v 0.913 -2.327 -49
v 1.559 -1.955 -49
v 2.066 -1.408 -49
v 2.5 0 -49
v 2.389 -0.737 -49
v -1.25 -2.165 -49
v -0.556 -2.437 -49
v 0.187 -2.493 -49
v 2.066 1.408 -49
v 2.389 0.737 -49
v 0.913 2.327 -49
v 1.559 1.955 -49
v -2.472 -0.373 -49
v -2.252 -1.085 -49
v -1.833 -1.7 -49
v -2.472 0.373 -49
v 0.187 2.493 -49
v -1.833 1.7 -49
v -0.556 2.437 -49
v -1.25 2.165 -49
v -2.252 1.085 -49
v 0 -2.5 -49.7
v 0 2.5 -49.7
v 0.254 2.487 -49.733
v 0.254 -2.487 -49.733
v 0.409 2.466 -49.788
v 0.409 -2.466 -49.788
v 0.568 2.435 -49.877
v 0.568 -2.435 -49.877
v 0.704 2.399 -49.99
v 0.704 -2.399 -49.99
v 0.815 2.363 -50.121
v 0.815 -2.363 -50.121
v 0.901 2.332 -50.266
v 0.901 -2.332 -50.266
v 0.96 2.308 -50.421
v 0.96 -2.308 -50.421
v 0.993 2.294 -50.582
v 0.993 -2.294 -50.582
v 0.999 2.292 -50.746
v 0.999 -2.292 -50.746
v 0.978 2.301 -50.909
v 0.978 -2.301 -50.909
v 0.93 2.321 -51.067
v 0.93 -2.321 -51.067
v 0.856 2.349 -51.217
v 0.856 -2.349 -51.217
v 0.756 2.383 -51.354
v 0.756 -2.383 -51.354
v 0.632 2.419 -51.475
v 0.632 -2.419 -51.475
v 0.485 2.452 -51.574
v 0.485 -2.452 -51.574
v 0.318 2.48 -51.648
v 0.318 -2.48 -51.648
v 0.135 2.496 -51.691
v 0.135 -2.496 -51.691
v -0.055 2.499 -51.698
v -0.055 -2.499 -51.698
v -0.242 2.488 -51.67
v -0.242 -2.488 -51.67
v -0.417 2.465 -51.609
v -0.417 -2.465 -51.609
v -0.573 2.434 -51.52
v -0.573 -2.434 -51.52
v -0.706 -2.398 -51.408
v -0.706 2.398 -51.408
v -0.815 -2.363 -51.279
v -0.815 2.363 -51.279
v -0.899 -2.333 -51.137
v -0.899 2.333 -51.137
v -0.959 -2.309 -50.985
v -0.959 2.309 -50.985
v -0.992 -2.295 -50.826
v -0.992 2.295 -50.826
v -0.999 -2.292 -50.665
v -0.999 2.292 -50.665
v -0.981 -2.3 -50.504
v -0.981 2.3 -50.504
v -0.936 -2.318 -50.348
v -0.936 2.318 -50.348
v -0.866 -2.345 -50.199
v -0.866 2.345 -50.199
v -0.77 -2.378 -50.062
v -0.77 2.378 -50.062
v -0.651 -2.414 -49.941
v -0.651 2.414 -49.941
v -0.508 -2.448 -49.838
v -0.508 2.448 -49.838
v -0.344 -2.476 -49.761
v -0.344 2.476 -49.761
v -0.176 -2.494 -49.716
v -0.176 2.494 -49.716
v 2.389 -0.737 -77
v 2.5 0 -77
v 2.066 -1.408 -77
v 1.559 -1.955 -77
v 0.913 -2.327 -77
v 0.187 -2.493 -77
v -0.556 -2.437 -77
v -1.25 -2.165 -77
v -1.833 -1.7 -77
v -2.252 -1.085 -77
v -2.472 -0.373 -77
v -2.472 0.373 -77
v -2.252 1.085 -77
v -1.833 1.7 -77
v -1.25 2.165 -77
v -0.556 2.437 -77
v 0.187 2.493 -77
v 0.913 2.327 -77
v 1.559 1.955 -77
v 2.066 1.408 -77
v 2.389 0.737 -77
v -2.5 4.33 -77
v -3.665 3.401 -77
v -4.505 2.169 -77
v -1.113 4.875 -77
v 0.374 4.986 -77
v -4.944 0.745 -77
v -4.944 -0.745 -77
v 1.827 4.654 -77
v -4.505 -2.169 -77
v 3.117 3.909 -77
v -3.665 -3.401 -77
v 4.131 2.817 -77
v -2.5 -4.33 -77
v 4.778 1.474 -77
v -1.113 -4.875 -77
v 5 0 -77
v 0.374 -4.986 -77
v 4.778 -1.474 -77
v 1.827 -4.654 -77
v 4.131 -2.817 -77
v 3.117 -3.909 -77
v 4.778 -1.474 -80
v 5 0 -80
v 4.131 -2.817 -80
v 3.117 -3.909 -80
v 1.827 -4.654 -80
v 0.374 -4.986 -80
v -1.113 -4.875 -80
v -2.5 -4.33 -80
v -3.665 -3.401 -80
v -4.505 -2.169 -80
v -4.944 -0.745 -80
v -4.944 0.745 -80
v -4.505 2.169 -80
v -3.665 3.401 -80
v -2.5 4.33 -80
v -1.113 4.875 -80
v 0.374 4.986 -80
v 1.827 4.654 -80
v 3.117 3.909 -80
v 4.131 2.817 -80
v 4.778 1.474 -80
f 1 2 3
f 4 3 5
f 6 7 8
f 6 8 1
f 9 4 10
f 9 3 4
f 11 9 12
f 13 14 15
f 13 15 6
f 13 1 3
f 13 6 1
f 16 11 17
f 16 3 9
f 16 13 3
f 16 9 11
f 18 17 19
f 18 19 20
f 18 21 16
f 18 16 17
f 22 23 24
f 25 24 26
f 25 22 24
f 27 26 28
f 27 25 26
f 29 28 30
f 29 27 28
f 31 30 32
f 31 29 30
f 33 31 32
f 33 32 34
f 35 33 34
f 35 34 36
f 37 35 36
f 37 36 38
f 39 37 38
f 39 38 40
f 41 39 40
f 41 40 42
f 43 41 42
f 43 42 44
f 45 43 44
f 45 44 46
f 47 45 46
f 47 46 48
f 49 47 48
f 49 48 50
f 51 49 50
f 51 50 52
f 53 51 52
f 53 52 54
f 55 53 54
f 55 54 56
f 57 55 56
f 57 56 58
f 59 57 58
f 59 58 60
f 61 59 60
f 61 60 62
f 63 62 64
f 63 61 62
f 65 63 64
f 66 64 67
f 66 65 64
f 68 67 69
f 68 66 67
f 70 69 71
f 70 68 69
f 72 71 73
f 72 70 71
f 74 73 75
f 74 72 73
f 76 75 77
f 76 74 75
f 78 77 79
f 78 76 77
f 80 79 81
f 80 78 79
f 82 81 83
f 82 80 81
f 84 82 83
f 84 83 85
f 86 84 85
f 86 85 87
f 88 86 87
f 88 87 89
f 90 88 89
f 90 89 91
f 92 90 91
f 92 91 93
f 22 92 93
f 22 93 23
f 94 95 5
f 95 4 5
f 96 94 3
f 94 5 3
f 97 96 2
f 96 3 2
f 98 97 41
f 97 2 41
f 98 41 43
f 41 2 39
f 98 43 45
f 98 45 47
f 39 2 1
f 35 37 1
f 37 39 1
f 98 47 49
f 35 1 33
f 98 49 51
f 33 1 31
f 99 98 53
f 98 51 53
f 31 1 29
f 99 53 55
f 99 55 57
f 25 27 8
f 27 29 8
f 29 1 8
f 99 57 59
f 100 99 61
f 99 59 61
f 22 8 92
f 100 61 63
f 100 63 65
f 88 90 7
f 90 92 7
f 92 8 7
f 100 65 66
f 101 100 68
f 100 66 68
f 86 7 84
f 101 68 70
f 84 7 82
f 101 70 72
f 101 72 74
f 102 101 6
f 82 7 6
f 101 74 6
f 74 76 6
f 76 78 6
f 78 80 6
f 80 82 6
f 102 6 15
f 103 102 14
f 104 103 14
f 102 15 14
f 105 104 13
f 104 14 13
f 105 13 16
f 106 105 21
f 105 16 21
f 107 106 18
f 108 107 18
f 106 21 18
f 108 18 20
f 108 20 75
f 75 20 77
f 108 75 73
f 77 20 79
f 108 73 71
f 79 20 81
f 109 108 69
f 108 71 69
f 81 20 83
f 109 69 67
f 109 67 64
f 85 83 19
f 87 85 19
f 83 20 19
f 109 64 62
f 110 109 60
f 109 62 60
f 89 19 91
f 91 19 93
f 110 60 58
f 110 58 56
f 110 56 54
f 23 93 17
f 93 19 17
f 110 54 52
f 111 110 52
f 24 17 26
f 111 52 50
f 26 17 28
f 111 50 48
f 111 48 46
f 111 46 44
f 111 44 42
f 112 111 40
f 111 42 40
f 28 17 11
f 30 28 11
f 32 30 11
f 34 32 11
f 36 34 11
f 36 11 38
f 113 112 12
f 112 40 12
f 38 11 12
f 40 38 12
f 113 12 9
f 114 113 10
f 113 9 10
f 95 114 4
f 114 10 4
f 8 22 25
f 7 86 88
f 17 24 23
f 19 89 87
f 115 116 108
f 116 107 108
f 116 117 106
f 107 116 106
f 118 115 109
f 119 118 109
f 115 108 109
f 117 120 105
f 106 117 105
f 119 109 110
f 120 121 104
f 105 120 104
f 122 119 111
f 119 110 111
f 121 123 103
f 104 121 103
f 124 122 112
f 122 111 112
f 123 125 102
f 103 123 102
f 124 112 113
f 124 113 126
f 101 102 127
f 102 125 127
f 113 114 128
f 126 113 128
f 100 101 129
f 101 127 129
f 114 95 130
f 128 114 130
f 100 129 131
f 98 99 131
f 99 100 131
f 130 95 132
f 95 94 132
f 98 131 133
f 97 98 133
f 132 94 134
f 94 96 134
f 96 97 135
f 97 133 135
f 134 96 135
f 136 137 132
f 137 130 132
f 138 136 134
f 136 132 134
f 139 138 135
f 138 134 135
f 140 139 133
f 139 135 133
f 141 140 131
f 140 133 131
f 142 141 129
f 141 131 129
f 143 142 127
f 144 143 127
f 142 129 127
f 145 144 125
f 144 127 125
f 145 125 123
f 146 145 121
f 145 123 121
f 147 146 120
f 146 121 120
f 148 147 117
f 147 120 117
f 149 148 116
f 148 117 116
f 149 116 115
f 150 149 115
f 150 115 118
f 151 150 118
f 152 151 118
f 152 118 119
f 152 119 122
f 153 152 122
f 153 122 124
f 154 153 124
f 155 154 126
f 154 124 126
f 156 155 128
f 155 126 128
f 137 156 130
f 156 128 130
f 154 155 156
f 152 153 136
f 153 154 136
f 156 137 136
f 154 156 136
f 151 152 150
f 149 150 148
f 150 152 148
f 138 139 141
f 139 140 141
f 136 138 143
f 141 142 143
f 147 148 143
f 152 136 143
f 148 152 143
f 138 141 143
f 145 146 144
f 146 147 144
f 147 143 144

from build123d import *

# Parameters (mm, degrees)
CUT_EXTRUDE1_DEPTH      = 81.311892021
CUT_EXTRUDE1_DEPTH_BACK = 81.311892021
SKETCH3_W               = 130
SKETCH3_H               = 11.269282723
CUT_EXTRUDE2_DEPTH      = 81.311892021
CUT_EXTRUDE2_DEPTH_BACK = 81.311892021
SKETCH4_R               = 1


with BuildPart() as part:
    # Sketch2 → Revolve1 (revolve)
    with BuildSketch(Plane(origin=(0, 0, 0), x_dir=(0, 0, -1), z_dir=(1, 0, 0)), mode=Mode.PRIVATE) as revolve1_sk:
        Polygon((80, 0), (80, 5), (77, 5), (77, 2.5), (-80, 2.5), (-80, 0), align=None)
    revolve(revolve1_sk.sketch.rotate(Axis((0, 0, 80), (0, 0, -1)), 90), axis=Axis((0, 0, 80), (0, 0, -1)))

    # Sketch3 → Cut-Extrude1 (cut, two sides: drawn at the far end of the back side and taken through both)
    with BuildSketch(Plane(origin=(0, 0, 0), x_dir=(0, 0, -1), z_dir=(1, 0, 0)).offset(-CUT_EXTRUDE1_DEPTH_BACK)):
        with Locations((-16, 0.112241111)):
            Rectangle(SKETCH3_W, SKETCH3_H)
    extrude(amount=CUT_EXTRUDE1_DEPTH + CUT_EXTRUDE1_DEPTH_BACK, mode=Mode.SUBTRACT)

    # Sketch4 → Cut-Extrude2 (cut, two sides: drawn at the far end of the back side and taken through both)
    with BuildSketch(Plane(origin=(0, 0, 0), x_dir=(1, 0, 0), z_dir=(0, 1, 0)).offset(-CUT_EXTRUDE2_DEPTH_BACK)):
        with Locations(Location((0, 50.7, 0), (0, 0, 270))):
            Circle(SKETCH4_R)
    extrude(amount=CUT_EXTRUDE2_DEPTH + CUT_EXTRUDE2_DEPTH_BACK, mode=Mode.SUBTRACT)


solid = part.part
